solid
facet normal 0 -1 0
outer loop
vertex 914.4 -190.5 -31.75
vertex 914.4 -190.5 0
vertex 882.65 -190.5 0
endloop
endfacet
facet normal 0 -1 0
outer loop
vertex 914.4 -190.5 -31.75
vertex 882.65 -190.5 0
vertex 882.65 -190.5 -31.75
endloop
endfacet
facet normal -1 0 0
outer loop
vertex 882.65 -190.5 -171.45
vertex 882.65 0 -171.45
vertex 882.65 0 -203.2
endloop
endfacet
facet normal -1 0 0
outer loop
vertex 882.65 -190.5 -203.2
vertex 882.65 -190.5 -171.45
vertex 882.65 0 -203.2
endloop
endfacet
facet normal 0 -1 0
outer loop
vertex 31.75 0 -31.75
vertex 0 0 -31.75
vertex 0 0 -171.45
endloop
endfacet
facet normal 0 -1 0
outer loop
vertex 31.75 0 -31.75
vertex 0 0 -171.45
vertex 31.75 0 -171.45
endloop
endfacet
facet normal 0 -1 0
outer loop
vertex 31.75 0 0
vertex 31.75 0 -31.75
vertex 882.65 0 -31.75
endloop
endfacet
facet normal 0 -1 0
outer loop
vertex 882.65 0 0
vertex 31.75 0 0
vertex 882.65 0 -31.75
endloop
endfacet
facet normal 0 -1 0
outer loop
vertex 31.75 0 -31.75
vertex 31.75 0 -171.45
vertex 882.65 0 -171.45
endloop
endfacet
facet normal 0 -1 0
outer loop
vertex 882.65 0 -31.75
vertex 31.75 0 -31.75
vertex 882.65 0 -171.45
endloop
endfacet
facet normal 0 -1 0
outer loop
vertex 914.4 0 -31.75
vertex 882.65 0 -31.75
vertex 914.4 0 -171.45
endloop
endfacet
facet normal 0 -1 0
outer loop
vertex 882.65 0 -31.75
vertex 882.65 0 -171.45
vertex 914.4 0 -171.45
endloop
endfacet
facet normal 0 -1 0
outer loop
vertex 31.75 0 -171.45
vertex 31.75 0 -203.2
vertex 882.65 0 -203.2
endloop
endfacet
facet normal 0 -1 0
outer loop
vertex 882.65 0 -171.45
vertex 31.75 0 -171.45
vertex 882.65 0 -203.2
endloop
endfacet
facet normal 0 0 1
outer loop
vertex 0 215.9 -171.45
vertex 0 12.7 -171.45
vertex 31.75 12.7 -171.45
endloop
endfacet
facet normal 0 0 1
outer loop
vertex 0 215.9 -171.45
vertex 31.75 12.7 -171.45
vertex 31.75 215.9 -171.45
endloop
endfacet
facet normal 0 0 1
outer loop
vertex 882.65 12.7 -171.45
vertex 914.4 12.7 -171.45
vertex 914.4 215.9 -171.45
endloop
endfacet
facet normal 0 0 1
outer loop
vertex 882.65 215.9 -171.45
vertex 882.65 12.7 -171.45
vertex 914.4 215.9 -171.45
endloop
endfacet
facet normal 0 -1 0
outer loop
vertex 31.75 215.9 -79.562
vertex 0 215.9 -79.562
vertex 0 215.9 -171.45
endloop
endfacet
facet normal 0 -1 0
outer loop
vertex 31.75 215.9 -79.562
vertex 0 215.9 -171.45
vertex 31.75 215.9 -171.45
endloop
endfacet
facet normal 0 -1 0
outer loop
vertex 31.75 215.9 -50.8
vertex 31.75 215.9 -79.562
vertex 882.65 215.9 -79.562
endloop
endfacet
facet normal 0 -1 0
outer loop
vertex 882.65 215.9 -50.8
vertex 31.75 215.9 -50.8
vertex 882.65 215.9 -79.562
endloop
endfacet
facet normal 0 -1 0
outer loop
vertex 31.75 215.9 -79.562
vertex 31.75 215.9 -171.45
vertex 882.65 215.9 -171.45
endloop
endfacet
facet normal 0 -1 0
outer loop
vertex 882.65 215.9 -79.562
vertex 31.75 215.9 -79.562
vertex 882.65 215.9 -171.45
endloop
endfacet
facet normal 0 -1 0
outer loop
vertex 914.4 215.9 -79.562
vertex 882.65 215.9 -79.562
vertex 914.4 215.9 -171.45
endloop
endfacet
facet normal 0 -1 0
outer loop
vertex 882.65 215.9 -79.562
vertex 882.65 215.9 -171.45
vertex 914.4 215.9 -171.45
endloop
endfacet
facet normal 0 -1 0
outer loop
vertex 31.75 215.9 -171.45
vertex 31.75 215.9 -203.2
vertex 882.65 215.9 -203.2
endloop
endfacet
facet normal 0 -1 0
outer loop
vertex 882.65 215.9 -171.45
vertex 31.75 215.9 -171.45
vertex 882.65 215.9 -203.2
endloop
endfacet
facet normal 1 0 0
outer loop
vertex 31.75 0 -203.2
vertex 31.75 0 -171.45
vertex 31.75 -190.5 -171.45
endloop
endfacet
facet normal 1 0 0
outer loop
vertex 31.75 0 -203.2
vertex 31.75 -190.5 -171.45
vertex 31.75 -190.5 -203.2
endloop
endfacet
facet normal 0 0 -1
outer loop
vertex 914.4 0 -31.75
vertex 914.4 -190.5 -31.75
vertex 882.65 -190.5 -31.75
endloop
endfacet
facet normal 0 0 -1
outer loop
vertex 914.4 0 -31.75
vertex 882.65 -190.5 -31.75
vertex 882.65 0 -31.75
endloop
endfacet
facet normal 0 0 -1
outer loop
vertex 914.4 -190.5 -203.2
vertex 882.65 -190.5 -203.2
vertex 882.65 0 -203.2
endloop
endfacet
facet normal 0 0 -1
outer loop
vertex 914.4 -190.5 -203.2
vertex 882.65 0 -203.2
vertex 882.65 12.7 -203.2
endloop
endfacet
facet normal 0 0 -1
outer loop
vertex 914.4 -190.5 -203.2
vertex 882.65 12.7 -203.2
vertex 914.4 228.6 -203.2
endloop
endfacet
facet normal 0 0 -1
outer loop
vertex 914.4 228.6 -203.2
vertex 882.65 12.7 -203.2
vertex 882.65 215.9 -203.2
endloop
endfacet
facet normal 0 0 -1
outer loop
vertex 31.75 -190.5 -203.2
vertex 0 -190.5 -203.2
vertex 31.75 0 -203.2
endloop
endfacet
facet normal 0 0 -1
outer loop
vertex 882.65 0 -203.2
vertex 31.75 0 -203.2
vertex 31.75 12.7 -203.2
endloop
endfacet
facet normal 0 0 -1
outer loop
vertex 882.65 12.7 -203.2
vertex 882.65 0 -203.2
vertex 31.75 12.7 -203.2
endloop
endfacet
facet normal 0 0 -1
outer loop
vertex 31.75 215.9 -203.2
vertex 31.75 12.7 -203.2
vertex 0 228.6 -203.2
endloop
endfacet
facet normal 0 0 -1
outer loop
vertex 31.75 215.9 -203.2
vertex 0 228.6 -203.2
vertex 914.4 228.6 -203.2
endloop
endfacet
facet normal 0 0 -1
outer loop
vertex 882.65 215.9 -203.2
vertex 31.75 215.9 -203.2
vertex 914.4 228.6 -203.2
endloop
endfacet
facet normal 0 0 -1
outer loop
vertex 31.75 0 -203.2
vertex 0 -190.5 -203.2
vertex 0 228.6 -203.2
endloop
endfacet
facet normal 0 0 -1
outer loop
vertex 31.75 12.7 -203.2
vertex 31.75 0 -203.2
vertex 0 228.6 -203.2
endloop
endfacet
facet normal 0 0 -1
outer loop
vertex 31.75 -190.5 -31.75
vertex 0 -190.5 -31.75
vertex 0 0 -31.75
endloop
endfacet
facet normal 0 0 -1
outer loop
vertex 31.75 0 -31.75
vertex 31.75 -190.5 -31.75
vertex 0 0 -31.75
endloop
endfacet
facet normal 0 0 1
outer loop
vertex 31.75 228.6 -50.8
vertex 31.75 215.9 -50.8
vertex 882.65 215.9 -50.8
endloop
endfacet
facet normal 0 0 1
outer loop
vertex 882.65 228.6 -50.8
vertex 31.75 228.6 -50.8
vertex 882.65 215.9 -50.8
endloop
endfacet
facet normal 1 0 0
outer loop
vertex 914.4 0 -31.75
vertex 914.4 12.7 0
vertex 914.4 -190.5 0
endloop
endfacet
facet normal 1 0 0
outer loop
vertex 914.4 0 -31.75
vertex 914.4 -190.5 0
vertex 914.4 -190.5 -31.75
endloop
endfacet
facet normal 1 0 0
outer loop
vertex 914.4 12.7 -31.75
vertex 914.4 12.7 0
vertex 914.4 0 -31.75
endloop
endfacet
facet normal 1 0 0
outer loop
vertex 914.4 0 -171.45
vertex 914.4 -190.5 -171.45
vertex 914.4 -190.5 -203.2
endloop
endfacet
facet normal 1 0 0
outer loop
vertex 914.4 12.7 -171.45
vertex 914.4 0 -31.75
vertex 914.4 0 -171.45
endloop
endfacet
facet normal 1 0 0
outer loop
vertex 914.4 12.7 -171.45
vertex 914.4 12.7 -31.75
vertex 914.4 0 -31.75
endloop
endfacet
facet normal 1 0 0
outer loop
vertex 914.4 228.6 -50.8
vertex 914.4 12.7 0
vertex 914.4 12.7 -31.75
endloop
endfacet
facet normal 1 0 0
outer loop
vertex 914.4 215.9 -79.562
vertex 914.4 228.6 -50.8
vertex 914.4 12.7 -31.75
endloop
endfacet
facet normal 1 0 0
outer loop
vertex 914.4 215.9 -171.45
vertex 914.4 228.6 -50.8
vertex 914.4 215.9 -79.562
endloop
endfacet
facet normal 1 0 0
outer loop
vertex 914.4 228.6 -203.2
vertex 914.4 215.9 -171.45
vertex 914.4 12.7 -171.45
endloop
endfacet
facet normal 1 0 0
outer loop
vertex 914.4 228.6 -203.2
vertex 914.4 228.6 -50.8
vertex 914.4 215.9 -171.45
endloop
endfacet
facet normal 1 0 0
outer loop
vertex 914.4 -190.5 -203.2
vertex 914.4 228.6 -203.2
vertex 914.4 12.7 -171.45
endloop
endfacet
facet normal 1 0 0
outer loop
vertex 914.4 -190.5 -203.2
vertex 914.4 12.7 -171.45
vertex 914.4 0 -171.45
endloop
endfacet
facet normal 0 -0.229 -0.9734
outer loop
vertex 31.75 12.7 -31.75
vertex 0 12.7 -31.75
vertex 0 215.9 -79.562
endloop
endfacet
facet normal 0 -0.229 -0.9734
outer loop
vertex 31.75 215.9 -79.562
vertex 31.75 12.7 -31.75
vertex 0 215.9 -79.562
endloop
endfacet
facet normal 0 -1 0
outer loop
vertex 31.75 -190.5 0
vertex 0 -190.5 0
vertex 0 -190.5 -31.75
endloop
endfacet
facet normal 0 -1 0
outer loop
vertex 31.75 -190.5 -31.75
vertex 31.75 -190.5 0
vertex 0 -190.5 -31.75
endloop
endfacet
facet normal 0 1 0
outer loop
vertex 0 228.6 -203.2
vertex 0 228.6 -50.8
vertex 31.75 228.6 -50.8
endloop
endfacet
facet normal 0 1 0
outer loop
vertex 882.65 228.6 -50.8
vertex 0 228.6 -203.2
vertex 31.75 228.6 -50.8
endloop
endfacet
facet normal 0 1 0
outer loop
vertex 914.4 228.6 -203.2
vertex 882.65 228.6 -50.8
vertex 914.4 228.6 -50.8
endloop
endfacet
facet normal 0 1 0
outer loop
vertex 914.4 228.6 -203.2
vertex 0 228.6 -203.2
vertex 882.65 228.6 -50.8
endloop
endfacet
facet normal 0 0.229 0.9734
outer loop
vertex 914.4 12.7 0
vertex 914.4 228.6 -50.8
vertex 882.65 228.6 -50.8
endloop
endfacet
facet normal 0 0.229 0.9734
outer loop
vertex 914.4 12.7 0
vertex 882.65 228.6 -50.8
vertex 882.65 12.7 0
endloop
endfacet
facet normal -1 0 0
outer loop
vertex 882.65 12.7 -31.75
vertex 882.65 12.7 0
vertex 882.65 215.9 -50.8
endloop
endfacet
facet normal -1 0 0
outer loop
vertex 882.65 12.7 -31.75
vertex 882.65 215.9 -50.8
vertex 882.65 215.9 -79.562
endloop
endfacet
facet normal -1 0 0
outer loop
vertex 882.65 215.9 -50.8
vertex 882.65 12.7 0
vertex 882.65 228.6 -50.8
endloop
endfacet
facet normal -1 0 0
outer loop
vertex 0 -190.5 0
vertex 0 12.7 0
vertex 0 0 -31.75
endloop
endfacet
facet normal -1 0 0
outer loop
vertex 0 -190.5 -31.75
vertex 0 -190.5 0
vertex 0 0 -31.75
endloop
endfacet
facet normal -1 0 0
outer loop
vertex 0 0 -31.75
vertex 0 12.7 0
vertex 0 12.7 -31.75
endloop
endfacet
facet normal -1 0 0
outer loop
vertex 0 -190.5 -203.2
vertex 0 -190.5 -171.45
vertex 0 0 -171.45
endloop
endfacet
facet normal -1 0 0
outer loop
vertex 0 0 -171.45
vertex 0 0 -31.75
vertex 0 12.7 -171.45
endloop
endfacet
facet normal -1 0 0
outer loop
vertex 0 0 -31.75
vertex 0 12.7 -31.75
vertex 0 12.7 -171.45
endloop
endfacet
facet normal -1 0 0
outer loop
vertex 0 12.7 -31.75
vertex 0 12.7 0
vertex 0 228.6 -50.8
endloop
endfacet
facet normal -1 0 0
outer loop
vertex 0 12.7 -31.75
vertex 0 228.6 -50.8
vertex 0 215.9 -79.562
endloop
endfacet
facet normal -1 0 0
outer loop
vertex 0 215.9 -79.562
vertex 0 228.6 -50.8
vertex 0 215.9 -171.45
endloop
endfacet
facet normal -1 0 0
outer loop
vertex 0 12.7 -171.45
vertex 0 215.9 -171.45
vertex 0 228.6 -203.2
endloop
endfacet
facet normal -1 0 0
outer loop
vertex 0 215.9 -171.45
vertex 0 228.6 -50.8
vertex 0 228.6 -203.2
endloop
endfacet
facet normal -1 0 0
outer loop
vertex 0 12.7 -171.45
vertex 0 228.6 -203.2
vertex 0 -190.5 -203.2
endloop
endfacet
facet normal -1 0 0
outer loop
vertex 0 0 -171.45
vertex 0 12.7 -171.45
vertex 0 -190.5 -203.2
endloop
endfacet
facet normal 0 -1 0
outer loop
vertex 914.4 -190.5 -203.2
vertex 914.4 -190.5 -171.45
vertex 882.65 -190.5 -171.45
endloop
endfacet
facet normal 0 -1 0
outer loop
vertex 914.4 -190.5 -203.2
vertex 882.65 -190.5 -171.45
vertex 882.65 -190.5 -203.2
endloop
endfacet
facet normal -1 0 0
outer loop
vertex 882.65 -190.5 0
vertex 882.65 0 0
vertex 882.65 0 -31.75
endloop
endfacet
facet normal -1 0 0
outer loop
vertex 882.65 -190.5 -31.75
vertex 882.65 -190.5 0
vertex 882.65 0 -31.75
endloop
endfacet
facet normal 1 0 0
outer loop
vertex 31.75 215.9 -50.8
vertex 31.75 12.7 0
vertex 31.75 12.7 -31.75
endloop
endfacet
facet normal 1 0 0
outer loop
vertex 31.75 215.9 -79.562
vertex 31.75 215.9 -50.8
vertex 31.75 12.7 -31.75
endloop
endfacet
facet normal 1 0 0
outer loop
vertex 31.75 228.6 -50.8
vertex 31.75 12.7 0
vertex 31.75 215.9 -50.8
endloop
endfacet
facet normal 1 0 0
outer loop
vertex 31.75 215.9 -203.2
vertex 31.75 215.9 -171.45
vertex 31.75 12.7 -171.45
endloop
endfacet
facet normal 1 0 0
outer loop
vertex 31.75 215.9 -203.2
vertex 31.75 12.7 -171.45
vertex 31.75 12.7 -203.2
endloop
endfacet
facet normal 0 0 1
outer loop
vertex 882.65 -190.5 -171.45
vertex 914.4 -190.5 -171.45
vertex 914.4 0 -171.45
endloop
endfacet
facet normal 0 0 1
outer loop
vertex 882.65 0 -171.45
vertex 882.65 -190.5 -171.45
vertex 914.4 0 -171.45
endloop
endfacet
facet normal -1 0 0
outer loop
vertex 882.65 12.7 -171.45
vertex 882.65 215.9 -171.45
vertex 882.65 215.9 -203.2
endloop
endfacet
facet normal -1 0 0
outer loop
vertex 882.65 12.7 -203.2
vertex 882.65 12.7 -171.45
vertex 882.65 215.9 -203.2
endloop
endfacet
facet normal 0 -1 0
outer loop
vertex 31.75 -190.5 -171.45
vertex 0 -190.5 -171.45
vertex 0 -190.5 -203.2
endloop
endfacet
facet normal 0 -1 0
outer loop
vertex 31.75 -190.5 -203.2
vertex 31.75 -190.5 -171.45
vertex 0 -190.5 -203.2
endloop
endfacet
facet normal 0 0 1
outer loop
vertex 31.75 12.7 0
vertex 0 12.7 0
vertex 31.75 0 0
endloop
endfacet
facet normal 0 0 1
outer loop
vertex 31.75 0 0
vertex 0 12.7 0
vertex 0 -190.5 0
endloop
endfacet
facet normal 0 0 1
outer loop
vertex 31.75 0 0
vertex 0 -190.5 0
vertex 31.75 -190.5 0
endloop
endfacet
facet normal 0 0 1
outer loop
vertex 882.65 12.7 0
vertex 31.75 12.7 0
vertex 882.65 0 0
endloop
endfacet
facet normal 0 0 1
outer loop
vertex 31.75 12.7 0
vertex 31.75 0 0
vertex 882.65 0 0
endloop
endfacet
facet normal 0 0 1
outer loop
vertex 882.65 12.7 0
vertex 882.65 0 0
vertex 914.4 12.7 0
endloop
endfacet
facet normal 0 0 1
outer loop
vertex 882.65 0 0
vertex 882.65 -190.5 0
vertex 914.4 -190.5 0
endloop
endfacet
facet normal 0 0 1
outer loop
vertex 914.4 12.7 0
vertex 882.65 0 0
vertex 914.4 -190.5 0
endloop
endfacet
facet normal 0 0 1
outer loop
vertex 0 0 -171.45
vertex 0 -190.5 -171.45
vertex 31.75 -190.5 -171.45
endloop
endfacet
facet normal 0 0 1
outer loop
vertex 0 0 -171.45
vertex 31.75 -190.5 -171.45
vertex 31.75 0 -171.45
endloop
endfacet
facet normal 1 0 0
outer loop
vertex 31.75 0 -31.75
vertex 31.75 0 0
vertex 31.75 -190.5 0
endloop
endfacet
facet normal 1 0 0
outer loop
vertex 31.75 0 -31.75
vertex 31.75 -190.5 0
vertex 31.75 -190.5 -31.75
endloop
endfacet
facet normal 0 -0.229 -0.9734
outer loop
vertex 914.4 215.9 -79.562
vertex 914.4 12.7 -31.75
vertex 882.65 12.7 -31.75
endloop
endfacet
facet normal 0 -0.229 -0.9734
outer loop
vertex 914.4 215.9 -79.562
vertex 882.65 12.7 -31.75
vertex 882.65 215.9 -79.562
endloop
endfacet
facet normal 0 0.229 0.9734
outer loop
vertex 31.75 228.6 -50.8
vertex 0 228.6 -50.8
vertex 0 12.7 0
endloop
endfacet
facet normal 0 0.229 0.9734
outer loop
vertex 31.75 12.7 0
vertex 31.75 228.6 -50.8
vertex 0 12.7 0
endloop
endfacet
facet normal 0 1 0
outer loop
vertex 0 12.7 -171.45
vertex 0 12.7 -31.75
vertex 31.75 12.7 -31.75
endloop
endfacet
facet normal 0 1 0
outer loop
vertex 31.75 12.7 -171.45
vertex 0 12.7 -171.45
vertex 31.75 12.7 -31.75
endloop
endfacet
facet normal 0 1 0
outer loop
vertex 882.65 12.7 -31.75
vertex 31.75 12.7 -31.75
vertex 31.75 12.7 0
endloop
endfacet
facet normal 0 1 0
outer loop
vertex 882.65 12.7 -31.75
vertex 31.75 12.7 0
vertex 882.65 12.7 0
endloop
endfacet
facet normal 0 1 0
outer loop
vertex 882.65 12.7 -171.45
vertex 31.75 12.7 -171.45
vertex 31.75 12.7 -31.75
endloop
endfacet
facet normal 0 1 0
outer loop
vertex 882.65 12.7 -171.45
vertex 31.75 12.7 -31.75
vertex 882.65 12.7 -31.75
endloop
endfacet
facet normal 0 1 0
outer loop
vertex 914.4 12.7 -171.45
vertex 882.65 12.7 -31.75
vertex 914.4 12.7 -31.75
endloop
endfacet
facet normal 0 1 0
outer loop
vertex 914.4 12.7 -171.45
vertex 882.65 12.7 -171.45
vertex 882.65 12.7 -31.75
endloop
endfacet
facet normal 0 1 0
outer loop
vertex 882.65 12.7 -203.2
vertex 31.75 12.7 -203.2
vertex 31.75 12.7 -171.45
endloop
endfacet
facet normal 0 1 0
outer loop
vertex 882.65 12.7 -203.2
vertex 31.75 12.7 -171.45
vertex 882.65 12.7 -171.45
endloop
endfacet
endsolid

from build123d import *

# Parameters (mm, degrees)
SKETCH1_W           = 914.4
SKETCH1_H           = 203.2
BOSS_EXTRUDE1_DEPTH = 12.7
SKETCH2_W           = 914.4
SKETCH2_H           = 152.4
BOSS_EXTRUDE2_DEPTH = 12.7
SKETCH3_W           = 31.75
SKETCH3_H           = 419.1
BOSS_EXTRUDE3_DEPTH = 31.75
BOSS_EXTRUDE4_START = -914.4
SKETCH3_2_W         = 31.75
SKETCH3_2_H         = 419.1
BOSS_EXTRUDE4_DEPTH = 31.75


with BuildPart() as part:
    # Sketch1 → Boss-Extrude1 (new body)
    with BuildSketch(Plane(origin=(0, 0, 0), x_dir=(1, 0, 0), z_dir=(0, 1, 0))):
        with Locations((457.2, 101.6)):
            Rectangle(SKETCH1_W, SKETCH1_H)
    extrude(amount=BOSS_EXTRUDE1_DEPTH)



with BuildPart() as body_2:
    # Sketch2 → Boss-Extrude2 (new body)
    with BuildSketch(Plane(origin=(0, 215.9, 0), x_dir=(1, 0, 0), z_dir=(0, 1, 0))):
        with Locations((457.2, 127)):
            Rectangle(SKETCH2_W, SKETCH2_H)
    extrude(amount=BOSS_EXTRUDE2_DEPTH)


with BuildPart() as part_1:
    add(part.part)

    add(body_2.part)  # Boss-Extrude3 merges body 2
    # Sketch3 → Boss-Extrude3 (add)
    with BuildSketch(Plane(origin=(914.4, 0, 0), x_dir=(0, 0, -1), z_dir=(1, 0, 0))):
        with Locations((187.325, 19.05)):
            Rectangle(SKETCH3_W, SKETCH3_H)
        Polygon((0, 12.7), (0, -190.5), (31.75, -190.5), (31.75, 12.7), (82.55, 228.6), (50.8, 228.6), align=None)
    extrude(amount=-BOSS_EXTRUDE3_DEPTH)

    # Sketch3<2> → Boss-Extrude4 (add)
    with BuildSketch(Plane(origin=(914.4, 0, 0), x_dir=(0, 0, -1), z_dir=(1, 0, 0)).offset(BOSS_EXTRUDE4_START)):
        with Locations((187.325, 19.05)):
            Rectangle(SKETCH3_2_W, SKETCH3_2_H)
        Polygon((0, 12.7), (0, -190.5), (31.75, -190.5), (31.75, 12.7), (82.55, 228.6), (50.8, 228.6), align=None)
    extrude(amount=BOSS_EXTRUDE4_DEPTH)


solid = part_1.part
